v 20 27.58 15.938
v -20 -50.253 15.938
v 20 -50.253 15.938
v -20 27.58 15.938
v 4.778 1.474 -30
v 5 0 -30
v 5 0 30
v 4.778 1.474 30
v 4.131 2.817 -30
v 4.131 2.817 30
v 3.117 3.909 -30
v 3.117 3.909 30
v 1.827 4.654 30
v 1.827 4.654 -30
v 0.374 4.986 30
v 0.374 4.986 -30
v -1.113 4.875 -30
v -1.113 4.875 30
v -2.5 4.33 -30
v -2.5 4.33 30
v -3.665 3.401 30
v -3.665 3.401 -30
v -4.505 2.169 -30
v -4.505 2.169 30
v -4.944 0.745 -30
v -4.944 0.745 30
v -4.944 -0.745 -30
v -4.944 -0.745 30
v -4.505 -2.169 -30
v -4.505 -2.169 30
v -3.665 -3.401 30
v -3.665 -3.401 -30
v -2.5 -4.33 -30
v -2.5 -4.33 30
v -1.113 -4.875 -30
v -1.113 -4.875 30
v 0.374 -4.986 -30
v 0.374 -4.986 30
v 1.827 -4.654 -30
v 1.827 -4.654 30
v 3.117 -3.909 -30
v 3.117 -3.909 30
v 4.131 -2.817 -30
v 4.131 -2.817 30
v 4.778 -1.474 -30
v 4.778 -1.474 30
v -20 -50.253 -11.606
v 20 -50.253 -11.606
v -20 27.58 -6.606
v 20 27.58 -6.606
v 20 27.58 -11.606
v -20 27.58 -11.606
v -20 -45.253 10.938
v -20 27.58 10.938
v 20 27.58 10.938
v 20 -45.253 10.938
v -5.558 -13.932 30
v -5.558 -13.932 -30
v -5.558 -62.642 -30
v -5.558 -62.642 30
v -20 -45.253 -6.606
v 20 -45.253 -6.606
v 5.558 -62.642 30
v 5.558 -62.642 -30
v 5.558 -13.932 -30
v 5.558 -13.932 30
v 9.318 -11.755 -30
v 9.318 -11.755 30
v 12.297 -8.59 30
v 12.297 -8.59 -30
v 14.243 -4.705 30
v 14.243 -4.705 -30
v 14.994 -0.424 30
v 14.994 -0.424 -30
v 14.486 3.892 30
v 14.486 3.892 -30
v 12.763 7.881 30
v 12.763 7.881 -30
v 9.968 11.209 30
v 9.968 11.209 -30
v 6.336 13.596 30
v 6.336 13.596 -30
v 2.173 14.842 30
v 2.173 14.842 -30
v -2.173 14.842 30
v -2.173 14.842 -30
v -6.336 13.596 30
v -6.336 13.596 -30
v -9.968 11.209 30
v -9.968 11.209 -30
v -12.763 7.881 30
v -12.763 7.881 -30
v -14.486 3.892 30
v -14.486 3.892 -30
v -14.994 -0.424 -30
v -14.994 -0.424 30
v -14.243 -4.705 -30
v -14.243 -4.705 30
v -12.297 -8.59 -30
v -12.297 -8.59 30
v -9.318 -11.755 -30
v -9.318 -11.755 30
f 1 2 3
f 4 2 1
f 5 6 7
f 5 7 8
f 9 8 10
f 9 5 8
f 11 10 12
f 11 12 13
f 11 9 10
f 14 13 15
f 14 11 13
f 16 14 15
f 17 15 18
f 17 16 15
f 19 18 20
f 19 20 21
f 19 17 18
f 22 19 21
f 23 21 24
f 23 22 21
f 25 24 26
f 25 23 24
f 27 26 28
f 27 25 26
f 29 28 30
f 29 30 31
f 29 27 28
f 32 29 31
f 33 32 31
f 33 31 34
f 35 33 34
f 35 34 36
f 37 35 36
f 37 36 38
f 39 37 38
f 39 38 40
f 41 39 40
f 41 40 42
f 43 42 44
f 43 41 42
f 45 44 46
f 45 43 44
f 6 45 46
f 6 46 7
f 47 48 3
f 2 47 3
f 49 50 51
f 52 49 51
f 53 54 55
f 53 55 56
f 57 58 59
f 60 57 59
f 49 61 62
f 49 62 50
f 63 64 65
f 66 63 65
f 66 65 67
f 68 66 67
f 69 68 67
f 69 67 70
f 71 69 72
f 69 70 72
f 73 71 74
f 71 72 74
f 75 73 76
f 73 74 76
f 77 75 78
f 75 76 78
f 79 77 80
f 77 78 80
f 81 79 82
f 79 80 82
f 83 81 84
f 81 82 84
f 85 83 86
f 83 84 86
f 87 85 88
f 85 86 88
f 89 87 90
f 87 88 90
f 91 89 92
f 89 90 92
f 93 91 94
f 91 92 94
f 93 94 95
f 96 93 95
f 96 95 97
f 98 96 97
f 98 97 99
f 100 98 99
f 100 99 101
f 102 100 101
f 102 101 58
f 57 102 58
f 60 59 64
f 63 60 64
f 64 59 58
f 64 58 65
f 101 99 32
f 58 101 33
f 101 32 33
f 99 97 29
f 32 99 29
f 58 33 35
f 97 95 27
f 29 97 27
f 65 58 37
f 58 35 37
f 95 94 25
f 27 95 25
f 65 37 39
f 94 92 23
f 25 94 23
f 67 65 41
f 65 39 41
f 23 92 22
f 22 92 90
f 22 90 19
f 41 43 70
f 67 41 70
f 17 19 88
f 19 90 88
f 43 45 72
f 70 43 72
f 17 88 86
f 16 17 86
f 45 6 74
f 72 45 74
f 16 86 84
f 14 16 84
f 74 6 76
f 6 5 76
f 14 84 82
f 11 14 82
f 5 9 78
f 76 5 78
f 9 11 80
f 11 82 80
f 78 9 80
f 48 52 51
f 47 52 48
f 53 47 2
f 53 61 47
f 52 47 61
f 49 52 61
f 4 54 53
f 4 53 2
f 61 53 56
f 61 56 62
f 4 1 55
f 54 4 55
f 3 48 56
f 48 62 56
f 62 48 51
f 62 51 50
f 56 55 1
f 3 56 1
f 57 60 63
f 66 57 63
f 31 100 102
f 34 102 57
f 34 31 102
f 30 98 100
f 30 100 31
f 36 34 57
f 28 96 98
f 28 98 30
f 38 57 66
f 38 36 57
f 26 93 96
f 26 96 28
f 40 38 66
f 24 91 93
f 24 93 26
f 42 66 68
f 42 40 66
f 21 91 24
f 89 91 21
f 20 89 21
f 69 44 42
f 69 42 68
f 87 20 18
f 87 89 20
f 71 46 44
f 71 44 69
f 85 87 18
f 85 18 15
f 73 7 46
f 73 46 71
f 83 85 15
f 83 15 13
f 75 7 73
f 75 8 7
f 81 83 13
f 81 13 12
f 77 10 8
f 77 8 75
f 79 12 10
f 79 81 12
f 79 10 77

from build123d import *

# Parameters (mm, degrees)
EXTRUDE_5_DEPTH      = 30
EXTRUDE_5_DEPTH_BACK = 30
F_1_FR_R             = 5
EXTRUDE_6_DEPTH      = 20
EXTRUDE_6_DEPTH_BACK = 20


with BuildPart() as part:
    # Эскиз1_fr → Бобышка-Вытянуть5 (new, two sides: drawn at the far end of the back side and taken through both)
    with BuildSketch(Plane.XY.offset(-EXTRUDE_5_DEPTH_BACK)):
        with BuildLine():
            Line((-5.557606452, -13.932444528), (-5.557606452, -62.642280008))
            Line((-5.557606452, -62.642280008), (5.557606452, -62.642280008))
            Line((5.557606452, -62.642280008), (5.557606452, -13.932444528))
            ThreePointArc((5.557606452, -13.932444528), (0, 15), (-5.557606452, -13.932444528))
        make_face()
        Circle(F_1_FR_R, mode=Mode.SUBTRACT)
    extrude(amount=EXTRUDE_5_DEPTH + EXTRUDE_5_DEPTH_BACK)


with BuildPart() as body_2:
    # Эскиз3 → Бобышка-Вытянуть6 (new, two sides: drawn at the far end of the back side and taken through both)
    with BuildSketch(Plane(origin=(0, 0, 0), x_dir=(0, 0, -1), z_dir=(1, 0, 0)).offset(-EXTRUDE_6_DEPTH_BACK)):
        Polygon((-58.394498043, -50.25314581), (-85.938130262, -50.25314581), (-85.938130262, 27.580465306), (-80.938130262, 27.580465306), (-80.938130262, -45.25314581), (-63.394498043, -45.25314581), (-63.394498043, 27.580465306), (-58.394498043, 27.580465306), align=None)
    extrude(amount=EXTRUDE_6_DEPTH + EXTRUDE_6_DEPTH_BACK)


with BuildPart() as body_2_1:
    # Move Body 1: moved
    add(body_2.part.moved(Location((0, 0, -70))))


solid = Compound([part.part, body_2_1.part])
